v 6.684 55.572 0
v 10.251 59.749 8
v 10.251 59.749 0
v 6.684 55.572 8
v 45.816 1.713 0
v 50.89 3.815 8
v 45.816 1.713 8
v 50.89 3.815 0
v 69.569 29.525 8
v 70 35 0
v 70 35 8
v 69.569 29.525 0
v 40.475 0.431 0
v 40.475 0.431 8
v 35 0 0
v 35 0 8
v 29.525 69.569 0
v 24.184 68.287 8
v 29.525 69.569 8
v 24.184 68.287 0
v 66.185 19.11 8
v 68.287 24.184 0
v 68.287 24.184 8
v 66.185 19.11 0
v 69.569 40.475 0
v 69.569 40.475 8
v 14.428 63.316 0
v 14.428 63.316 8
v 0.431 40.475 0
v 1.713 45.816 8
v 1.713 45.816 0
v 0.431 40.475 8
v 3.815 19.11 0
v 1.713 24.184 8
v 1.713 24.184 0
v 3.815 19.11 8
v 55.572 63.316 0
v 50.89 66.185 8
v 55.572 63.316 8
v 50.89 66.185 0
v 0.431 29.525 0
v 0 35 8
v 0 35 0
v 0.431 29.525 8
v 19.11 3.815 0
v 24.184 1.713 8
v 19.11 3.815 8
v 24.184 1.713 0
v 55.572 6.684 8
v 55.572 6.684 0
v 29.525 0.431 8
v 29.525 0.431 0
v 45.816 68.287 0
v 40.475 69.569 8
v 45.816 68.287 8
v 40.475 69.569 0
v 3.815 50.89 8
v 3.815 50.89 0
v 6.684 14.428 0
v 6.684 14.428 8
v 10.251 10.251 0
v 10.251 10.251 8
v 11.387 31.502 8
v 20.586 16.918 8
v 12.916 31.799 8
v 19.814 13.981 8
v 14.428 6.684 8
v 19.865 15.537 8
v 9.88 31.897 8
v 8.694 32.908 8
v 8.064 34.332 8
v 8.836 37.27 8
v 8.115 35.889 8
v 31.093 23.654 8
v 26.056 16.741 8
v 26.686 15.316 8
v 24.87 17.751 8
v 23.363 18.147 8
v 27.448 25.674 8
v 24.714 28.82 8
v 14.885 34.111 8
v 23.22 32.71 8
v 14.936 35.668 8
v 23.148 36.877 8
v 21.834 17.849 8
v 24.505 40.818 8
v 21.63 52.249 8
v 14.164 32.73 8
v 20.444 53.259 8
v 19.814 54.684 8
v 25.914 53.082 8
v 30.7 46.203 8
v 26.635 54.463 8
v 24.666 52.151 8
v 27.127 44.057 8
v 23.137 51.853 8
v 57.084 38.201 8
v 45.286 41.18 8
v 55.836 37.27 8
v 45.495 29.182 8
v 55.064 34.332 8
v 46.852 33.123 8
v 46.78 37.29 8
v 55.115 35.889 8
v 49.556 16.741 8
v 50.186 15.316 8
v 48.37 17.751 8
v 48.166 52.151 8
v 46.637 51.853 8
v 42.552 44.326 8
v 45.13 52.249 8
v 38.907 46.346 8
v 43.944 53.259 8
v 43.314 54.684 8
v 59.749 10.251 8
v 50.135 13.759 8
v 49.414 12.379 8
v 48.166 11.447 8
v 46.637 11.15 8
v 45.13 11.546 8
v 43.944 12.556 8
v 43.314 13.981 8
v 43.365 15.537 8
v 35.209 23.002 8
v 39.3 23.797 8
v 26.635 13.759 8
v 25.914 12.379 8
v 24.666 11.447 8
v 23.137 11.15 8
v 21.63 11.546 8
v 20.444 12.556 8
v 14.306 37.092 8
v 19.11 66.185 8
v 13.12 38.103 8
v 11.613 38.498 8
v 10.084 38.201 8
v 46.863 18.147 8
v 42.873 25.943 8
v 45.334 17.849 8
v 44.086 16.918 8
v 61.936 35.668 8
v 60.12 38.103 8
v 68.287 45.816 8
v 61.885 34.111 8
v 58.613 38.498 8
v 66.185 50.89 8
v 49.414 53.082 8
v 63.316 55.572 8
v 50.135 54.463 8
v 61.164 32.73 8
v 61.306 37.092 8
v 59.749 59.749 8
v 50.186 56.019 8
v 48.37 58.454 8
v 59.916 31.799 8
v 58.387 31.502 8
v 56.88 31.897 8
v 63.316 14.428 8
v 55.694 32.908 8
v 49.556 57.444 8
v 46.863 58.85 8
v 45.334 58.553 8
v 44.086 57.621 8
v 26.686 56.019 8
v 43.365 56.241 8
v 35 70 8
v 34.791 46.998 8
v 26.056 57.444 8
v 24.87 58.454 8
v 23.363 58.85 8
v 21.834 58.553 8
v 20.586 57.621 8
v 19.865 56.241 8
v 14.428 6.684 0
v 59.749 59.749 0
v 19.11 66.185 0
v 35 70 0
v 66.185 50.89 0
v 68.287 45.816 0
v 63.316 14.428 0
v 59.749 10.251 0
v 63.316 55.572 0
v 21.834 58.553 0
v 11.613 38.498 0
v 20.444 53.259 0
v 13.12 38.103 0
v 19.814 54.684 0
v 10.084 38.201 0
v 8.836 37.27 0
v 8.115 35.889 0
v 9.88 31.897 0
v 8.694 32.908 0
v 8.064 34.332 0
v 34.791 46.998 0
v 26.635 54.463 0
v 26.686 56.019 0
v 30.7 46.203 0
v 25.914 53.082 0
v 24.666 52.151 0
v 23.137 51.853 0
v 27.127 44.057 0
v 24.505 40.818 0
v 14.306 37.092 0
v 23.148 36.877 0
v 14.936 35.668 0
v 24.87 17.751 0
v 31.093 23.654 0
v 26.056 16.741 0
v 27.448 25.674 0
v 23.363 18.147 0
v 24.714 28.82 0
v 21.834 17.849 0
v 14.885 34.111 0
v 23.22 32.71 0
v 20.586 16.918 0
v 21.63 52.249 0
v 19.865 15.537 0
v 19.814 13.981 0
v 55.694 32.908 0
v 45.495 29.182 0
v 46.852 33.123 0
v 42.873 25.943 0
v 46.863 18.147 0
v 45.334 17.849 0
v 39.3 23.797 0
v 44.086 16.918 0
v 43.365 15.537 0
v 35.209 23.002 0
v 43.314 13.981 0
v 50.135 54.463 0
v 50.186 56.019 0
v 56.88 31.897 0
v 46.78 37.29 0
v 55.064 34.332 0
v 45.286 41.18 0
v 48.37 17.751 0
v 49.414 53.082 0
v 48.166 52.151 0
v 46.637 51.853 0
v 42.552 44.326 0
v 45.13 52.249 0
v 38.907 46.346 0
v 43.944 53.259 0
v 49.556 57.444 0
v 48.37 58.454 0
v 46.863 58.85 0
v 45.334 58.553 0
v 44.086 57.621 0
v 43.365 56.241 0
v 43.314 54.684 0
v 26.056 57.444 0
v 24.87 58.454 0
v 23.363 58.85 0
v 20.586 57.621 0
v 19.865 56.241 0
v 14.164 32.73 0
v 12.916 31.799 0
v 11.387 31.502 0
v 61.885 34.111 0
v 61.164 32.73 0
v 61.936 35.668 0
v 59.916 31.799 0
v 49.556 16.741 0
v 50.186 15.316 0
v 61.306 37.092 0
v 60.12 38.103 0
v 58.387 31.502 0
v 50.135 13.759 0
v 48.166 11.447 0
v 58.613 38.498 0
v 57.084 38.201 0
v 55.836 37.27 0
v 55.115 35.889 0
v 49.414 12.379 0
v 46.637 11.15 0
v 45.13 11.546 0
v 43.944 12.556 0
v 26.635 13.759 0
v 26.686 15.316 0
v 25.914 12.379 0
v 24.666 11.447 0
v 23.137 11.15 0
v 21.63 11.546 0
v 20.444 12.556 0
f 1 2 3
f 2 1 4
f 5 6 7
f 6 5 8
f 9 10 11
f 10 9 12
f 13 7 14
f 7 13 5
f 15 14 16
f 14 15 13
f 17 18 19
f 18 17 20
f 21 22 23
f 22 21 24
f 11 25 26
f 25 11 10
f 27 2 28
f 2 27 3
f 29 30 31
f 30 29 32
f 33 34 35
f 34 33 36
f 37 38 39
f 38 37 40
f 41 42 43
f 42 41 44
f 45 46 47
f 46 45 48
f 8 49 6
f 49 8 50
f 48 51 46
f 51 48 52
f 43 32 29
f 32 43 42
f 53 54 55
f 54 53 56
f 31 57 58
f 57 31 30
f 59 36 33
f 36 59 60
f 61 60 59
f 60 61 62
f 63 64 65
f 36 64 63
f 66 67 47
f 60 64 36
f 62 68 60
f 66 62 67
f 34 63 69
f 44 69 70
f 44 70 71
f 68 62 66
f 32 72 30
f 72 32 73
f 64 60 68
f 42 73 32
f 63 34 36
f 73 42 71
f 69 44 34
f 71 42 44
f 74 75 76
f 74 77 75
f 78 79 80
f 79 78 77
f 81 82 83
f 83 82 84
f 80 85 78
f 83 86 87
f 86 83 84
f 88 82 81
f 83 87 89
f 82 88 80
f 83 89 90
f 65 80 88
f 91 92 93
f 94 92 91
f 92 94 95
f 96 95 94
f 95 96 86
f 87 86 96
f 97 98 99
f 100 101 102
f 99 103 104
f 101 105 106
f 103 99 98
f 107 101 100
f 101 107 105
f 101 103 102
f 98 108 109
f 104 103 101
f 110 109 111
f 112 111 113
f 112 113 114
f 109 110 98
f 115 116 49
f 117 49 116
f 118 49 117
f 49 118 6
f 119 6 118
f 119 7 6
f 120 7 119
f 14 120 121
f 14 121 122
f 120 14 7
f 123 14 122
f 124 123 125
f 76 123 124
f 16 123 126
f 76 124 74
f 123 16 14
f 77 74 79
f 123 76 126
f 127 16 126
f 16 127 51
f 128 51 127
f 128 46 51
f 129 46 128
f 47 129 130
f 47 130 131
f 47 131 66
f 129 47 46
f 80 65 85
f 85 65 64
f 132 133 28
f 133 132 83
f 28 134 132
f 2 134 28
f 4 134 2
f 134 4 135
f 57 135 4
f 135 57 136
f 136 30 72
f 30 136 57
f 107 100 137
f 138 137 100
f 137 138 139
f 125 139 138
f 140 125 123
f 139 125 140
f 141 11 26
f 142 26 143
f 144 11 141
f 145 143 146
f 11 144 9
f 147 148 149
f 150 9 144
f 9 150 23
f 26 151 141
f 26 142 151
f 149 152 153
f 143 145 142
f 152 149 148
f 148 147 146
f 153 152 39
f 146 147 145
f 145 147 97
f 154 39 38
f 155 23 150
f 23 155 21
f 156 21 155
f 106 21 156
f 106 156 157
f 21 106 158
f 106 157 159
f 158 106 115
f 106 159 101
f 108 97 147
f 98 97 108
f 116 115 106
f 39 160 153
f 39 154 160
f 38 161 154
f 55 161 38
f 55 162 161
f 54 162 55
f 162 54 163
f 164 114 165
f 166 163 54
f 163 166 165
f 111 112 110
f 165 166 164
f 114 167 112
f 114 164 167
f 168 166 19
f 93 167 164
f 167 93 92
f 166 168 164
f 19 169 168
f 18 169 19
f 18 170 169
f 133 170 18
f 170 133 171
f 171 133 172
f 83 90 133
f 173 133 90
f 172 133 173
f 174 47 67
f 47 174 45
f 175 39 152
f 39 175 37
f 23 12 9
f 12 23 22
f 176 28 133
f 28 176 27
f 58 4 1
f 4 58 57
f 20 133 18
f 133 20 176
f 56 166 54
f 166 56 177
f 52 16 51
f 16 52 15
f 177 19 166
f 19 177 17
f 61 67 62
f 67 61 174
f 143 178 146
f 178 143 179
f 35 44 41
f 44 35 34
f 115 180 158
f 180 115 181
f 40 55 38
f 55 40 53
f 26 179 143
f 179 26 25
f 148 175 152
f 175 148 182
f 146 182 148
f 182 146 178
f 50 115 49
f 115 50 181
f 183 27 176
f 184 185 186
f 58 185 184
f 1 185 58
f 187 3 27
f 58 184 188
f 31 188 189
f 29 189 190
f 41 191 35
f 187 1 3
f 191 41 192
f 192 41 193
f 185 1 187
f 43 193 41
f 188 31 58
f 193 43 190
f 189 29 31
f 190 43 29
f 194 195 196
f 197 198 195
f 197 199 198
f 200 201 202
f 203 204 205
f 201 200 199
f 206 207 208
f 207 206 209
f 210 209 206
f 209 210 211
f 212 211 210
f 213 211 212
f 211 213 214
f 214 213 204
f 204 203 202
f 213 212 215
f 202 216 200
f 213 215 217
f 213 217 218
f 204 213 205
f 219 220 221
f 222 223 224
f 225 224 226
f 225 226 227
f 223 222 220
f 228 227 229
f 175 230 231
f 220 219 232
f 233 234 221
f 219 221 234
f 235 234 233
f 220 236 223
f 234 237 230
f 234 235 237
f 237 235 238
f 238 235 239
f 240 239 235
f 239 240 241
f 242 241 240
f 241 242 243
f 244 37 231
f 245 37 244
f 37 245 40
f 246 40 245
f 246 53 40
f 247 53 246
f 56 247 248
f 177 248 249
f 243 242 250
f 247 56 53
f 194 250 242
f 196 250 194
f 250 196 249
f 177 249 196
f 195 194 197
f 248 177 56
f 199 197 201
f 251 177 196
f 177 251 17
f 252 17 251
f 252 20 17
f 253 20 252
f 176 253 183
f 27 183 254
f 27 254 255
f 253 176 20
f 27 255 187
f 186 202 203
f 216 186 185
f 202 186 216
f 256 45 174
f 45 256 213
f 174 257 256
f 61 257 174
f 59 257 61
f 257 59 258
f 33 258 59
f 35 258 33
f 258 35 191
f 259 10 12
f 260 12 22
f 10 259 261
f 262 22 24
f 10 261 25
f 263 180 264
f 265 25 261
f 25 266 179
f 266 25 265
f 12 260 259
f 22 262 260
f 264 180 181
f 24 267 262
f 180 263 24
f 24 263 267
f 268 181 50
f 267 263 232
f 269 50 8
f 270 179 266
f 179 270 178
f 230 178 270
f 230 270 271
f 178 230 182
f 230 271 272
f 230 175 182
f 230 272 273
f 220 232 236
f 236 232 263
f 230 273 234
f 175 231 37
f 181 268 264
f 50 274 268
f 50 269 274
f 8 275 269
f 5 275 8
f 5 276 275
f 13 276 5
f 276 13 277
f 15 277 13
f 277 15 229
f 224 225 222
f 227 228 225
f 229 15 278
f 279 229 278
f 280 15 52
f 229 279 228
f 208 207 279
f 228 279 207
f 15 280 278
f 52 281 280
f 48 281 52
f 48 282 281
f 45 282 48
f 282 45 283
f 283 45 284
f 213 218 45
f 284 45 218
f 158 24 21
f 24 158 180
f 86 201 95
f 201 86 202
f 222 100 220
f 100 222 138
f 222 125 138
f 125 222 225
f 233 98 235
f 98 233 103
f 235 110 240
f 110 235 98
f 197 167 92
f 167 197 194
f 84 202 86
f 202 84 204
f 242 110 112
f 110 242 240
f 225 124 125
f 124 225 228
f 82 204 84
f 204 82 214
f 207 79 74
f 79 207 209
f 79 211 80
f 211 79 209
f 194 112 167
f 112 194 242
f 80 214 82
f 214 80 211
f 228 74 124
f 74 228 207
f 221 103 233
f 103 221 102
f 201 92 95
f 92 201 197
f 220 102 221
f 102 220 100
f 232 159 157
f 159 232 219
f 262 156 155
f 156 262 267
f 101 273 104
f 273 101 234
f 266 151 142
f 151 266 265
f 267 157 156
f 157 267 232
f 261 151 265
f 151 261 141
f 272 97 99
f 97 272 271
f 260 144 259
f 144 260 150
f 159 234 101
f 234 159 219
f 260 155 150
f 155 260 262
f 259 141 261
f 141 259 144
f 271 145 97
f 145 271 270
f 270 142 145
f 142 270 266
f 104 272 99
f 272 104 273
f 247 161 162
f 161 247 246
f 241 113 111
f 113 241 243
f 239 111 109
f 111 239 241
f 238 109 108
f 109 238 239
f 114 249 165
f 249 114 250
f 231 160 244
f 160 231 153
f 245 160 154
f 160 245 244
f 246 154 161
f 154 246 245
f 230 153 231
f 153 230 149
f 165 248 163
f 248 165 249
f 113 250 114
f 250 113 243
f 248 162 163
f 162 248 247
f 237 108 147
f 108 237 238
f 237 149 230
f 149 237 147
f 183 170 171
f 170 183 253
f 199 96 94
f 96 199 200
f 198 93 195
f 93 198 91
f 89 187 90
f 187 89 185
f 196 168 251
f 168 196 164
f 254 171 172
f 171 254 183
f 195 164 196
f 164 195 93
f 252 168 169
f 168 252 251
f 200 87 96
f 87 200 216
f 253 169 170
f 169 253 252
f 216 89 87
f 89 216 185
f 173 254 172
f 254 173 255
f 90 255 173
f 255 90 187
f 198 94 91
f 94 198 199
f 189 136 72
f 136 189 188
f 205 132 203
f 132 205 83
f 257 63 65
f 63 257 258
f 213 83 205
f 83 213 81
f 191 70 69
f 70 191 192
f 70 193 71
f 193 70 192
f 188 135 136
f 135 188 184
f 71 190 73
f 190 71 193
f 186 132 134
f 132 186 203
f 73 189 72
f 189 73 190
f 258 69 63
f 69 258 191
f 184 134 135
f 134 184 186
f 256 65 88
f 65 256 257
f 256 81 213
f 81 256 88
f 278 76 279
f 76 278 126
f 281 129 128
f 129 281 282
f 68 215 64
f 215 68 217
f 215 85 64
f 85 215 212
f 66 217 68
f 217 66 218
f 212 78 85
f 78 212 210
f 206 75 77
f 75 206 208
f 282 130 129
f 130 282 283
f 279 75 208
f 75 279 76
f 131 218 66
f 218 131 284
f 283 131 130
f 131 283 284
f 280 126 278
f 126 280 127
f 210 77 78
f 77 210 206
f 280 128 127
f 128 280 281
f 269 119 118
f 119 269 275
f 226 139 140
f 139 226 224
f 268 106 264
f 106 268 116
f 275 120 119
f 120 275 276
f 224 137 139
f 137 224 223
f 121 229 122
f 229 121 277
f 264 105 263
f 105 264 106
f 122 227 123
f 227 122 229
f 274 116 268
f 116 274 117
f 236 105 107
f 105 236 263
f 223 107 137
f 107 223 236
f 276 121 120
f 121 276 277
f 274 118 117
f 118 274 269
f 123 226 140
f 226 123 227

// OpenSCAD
$fn = 32;

// ----------------------------------------------------------------------
// Spacer plate: round flange R35, 6 bolts
// ----------------------------------------------------------------------

// --- parameters (mm) ---
bore_r = 12;              // centre bore radius
bolt_r = 3.5;             // bolt hole radius
plate_t = 8;              // plate thickness, Z (extrusion height)
flange_r = 35;            // flange radius
n_bolt = 6;               // bolt hole count
ring_r = 23.5;            // bolt circle radius
fit_tol = 0.1;            // declared fit tolerance (prompt contract)
free_tol = 0.3;           // declared free tolerance (prompt contract)

profile = [[70, 35], [69.569, 40.475], [68.287, 45.816], [66.185, 50.89], [63.316, 55.572], [59.749, 59.749], [55.572, 63.316], [50.89, 66.185], [45.816, 68.287], [40.475, 69.569], [35, 70], [29.525, 69.569], [24.184, 68.287], [19.11, 66.185], [14.428, 63.316], [10.251, 59.749], [6.684, 55.572], [3.815, 50.89], [1.713, 45.816], [0.431, 40.475], [0, 35], [0.431, 29.525], [1.713, 24.184], [3.815, 19.11], [6.684, 14.428], [10.251, 10.251], [14.428, 6.684], [19.11, 3.815], [24.184, 1.713], [29.525, 0.431], [35, 0], [40.475, 0.431], [45.816, 1.713], [50.89, 3.815], [55.572, 6.684], [59.749, 10.251], [63.316, 14.428], [66.185, 19.11], [68.287, 24.184], [69.569, 29.525]];  // primary outline, 40 points, counter clockwise
void_1 = [[46.78, 37.29], [45.286, 41.18], [42.552, 44.326], [38.907, 46.346], [34.791, 46.998], [30.7, 46.203], [27.127, 44.057], [24.505, 40.818], [23.148, 36.877], [23.22, 32.71], [24.714, 28.82], [27.448, 25.674], [31.093, 23.654], [35.209, 23.002], [39.3, 23.797], [42.873, 25.943], [45.495, 29.182], [46.852, 33.123]];  // centre bore, 18 points
void_2 = [[61.936, 35.668], [61.306, 37.092], [60.12, 38.103], [58.613, 38.498], [57.084, 38.201], [55.836, 37.27], [55.115, 35.889], [55.064, 34.332], [55.694, 32.908], [56.88, 31.897], [58.387, 31.502], [59.916, 31.799], [61.164, 32.73], [61.885, 34.111]];  // bolt hole 1, 14 points
void_3 = [[50.186, 56.019], [49.556, 57.444], [48.37, 58.454], [46.863, 58.85], [45.334, 58.553], [44.086, 57.621], [43.365, 56.241], [43.314, 54.684], [43.944, 53.259], [45.13, 52.249], [46.637, 51.853], [48.166, 52.151], [49.414, 53.082], [50.135, 54.463]];  // bolt hole 2, 14 points
void_4 = [[26.686, 56.019], [26.056, 57.444], [24.87, 58.454], [23.363, 58.85], [21.834, 58.553], [20.586, 57.621], [19.865, 56.241], [19.814, 54.684], [20.444, 53.259], [21.63, 52.249], [23.137, 51.853], [24.666, 52.151], [25.914, 53.082], [26.635, 54.463]];  // bolt hole 3, 14 points
void_5 = [[14.936, 35.668], [14.306, 37.092], [13.12, 38.103], [11.613, 38.498], [10.084, 38.201], [8.836, 37.27], [8.115, 35.889], [8.064, 34.332], [8.694, 32.908], [9.88, 31.897], [11.387, 31.502], [12.916, 31.799], [14.164, 32.73], [14.885, 34.111]];  // bolt hole 4, 14 points
void_6 = [[26.686, 15.316], [26.056, 16.741], [24.87, 17.751], [23.363, 18.147], [21.834, 17.849], [20.586, 16.918], [19.865, 15.537], [19.814, 13.981], [20.444, 12.556], [21.63, 11.546], [23.137, 11.15], [24.666, 11.447], [25.914, 12.379], [26.635, 13.759]];  // bolt hole 5, 14 points
void_7 = [[50.186, 15.316], [49.556, 16.741], [48.37, 17.751], [46.863, 18.147], [45.334, 17.849], [44.086, 16.918], [43.365, 15.537], [43.314, 13.981], [43.944, 12.556], [45.13, 11.546], [46.637, 11.15], [48.166, 11.447], [49.414, 12.379], [50.135, 13.759]];  // bolt hole 6, 14 points

// --- the one profile operation ---
difference() {
  linear_extrude(height = plate_t) polygon(points = profile);
  translate([0, 0, -1])
    linear_extrude(height = plate_t + 2) polygon(points = void_1);
  translate([0, 0, -1])
    linear_extrude(height = plate_t + 2) polygon(points = void_2);
  translate([0, 0, -1])
    linear_extrude(height = plate_t + 2) polygon(points = void_3);
  translate([0, 0, -1])
    linear_extrude(height = plate_t + 2) polygon(points = void_4);
  translate([0, 0, -1])
    linear_extrude(height = plate_t + 2) polygon(points = void_5);
  translate([0, 0, -1])
    linear_extrude(height = plate_t + 2) polygon(points = void_6);
  translate([0, 0, -1])
    linear_extrude(height = plate_t + 2) polygon(points = void_7);
}
